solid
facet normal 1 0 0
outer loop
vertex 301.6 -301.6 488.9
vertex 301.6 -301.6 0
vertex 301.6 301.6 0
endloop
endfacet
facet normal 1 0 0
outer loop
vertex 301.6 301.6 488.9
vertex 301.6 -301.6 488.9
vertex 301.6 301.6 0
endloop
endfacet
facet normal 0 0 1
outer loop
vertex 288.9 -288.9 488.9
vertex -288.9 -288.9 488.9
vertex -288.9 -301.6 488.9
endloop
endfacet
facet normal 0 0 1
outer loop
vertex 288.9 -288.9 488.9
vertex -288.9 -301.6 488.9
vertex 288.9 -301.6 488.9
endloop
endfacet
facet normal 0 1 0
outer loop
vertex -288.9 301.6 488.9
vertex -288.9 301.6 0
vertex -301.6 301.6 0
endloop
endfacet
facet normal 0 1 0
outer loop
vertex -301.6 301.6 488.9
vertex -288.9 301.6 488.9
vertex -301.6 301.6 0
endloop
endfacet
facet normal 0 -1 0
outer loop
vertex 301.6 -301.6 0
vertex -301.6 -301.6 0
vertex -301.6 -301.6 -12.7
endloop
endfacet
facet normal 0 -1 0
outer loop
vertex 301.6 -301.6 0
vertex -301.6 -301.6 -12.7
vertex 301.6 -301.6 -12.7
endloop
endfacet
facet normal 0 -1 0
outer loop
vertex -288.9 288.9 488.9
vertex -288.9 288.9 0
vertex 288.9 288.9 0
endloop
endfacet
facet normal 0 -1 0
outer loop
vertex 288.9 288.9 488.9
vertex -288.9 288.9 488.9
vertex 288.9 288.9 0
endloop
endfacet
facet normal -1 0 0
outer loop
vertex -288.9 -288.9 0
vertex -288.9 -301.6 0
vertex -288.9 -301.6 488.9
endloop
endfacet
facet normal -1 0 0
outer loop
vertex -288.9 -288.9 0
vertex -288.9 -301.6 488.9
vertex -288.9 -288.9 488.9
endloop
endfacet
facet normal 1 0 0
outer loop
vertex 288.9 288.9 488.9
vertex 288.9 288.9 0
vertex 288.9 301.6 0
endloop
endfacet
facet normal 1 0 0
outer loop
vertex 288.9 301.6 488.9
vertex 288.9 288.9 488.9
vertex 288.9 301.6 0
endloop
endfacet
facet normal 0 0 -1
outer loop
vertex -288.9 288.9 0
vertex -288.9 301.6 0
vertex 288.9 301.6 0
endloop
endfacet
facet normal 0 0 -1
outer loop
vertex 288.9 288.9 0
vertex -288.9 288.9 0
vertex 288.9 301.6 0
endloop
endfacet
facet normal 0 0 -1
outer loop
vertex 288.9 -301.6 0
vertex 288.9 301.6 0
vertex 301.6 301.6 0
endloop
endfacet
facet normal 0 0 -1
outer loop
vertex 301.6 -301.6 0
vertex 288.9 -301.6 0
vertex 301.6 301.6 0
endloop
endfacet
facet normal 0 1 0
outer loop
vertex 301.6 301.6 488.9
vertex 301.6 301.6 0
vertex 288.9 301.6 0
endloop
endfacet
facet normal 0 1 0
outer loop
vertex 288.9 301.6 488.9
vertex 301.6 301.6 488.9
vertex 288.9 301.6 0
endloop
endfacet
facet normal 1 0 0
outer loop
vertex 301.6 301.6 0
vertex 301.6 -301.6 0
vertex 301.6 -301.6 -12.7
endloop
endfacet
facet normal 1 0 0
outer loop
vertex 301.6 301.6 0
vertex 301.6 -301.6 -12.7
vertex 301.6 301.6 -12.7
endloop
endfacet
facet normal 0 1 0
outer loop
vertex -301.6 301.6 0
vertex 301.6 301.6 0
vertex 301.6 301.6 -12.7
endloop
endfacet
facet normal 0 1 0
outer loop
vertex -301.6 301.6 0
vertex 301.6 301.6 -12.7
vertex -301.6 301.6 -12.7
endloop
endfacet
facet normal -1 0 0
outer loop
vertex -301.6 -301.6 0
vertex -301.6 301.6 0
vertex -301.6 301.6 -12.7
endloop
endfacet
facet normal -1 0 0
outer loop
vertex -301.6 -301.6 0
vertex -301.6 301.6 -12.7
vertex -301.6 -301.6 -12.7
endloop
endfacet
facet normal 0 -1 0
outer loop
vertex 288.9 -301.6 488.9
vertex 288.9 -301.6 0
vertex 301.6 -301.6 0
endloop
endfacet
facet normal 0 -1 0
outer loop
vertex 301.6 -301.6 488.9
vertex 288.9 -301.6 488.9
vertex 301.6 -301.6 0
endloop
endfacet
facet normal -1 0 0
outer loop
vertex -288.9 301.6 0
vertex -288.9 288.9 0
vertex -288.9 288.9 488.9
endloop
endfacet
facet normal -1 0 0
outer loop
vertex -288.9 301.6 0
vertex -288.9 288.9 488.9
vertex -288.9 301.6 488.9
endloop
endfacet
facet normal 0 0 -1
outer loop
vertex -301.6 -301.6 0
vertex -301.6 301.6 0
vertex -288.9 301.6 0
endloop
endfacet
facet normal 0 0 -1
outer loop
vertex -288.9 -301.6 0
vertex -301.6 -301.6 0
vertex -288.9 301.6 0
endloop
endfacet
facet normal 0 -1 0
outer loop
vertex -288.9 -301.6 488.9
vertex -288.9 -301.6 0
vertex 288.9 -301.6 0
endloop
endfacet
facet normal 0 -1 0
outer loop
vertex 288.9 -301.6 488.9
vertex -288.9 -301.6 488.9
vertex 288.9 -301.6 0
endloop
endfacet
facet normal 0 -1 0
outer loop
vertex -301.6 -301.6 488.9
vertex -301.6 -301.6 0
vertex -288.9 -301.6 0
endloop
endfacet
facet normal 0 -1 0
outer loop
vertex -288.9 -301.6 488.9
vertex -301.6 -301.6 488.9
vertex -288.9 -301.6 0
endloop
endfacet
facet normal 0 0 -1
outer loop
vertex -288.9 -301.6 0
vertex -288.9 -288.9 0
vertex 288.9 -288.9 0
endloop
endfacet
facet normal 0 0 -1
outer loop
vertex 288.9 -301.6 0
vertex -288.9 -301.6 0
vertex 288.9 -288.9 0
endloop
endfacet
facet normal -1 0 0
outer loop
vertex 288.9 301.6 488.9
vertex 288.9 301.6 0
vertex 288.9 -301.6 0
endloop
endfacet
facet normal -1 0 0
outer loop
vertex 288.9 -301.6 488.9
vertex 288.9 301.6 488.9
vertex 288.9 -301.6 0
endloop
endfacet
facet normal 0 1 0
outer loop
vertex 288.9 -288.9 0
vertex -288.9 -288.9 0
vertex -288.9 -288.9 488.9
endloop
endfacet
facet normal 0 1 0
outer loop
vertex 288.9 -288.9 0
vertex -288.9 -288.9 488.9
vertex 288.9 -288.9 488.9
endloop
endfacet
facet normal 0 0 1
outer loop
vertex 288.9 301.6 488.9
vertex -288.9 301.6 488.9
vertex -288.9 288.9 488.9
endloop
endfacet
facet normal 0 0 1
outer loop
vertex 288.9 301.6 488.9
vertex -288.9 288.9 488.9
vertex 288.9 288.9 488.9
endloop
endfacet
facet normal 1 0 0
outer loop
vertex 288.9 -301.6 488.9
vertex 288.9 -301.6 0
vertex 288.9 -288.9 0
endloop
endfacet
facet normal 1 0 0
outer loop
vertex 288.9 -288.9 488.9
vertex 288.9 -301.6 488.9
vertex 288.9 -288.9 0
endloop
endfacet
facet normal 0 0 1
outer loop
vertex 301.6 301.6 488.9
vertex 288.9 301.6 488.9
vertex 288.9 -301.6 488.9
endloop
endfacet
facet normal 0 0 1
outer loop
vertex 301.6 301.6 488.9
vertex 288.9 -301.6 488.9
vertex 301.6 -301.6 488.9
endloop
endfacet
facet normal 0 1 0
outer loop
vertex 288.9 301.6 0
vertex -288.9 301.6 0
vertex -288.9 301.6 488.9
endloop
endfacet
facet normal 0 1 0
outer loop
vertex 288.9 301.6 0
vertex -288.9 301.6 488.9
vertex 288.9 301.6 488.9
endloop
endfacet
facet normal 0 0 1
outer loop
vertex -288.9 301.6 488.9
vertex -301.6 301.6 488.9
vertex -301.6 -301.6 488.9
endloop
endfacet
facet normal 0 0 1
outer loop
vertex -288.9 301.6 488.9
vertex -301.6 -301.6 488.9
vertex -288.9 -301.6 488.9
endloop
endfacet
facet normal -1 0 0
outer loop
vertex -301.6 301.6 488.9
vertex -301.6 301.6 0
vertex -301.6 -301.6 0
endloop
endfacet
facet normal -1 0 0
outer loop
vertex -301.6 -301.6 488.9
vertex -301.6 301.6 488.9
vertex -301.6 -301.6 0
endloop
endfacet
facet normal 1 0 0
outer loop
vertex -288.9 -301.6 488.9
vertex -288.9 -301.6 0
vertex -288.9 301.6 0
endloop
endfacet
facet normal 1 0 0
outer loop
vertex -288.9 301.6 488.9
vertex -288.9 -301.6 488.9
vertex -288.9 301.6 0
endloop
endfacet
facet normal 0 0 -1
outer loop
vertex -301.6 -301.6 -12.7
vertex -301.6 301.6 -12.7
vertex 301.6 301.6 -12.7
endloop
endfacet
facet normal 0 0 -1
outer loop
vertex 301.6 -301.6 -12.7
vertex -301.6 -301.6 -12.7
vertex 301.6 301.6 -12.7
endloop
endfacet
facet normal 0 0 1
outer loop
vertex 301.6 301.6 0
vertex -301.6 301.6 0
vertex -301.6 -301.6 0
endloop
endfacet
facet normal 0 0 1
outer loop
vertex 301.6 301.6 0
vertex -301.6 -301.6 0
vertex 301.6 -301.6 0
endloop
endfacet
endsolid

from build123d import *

# Parameters (mm, degrees)
F0_W     = 577.8
F0_H     = 577.8
F0_H_2   = 12.7
F1_DEPTH = 12.7
F2_DEPTH = 488.9
F3_DEPTH = 488.9
F4_DEPTH = 488.9
F5_DEPTH = 488.9


with BuildPart() as f1:
    # F0 (on Top) → F1 (new body)
    with BuildSketch(Plane.XY):
        Rectangle(F0_W, F0_H)
        Polygon((-288.9, -288.9), (-288.9, 288.9), (-288.9, 301.6), (-301.6, 301.6), (-301.6, -301.6), (-288.9, -301.6), align=None)
        with Locations((0, 295.25)):
            Rectangle(F0_W, F0_H_2)
        Polygon((288.9, 301.6), (288.9, 288.9), (288.9, -288.9), (288.9, -301.6), (301.6, -301.6), (301.6, 301.6), align=None)
        with Locations((0, -295.25)):
            Rectangle(F0_W, F0_H_2)
    extrude(amount=-F1_DEPTH)


with BuildPart() as f2:
    # F0 (on Top) → F2 (new body)
    with BuildSketch(Plane.XY):
        with Locations((0, 295.25)):
            Rectangle(F0_W, F0_H_2)
    extrude(amount=F2_DEPTH)


with BuildPart() as f3:
    # F0 (on Top) → F3 (new body)
    with BuildSketch(Plane.XY):
        Polygon((-288.9, -288.9), (-288.9, 288.9), (-288.9, 301.6), (-301.6, 301.6), (-301.6, -301.6), (-288.9, -301.6), align=None)
    extrude(amount=F3_DEPTH)


with BuildPart() as f4:
    # F0 (on Top) → F4 (new body)
    with BuildSketch(Plane.XY):
        Polygon((288.9, 301.6), (288.9, 288.9), (288.9, -288.9), (288.9, -301.6), (301.6, -301.6), (301.6, 301.6), align=None)
    extrude(amount=F4_DEPTH)


with BuildPart() as f5:
    # F0 (on Top) → F5 (new body)
    with BuildSketch(Plane.XY):
        with Locations((0, -295.25)):
            Rectangle(F0_W, F0_H_2)
    extrude(amount=F5_DEPTH)


solid = Compound([f1.part, f2.part, f3.part, f4.part, f5.part])
